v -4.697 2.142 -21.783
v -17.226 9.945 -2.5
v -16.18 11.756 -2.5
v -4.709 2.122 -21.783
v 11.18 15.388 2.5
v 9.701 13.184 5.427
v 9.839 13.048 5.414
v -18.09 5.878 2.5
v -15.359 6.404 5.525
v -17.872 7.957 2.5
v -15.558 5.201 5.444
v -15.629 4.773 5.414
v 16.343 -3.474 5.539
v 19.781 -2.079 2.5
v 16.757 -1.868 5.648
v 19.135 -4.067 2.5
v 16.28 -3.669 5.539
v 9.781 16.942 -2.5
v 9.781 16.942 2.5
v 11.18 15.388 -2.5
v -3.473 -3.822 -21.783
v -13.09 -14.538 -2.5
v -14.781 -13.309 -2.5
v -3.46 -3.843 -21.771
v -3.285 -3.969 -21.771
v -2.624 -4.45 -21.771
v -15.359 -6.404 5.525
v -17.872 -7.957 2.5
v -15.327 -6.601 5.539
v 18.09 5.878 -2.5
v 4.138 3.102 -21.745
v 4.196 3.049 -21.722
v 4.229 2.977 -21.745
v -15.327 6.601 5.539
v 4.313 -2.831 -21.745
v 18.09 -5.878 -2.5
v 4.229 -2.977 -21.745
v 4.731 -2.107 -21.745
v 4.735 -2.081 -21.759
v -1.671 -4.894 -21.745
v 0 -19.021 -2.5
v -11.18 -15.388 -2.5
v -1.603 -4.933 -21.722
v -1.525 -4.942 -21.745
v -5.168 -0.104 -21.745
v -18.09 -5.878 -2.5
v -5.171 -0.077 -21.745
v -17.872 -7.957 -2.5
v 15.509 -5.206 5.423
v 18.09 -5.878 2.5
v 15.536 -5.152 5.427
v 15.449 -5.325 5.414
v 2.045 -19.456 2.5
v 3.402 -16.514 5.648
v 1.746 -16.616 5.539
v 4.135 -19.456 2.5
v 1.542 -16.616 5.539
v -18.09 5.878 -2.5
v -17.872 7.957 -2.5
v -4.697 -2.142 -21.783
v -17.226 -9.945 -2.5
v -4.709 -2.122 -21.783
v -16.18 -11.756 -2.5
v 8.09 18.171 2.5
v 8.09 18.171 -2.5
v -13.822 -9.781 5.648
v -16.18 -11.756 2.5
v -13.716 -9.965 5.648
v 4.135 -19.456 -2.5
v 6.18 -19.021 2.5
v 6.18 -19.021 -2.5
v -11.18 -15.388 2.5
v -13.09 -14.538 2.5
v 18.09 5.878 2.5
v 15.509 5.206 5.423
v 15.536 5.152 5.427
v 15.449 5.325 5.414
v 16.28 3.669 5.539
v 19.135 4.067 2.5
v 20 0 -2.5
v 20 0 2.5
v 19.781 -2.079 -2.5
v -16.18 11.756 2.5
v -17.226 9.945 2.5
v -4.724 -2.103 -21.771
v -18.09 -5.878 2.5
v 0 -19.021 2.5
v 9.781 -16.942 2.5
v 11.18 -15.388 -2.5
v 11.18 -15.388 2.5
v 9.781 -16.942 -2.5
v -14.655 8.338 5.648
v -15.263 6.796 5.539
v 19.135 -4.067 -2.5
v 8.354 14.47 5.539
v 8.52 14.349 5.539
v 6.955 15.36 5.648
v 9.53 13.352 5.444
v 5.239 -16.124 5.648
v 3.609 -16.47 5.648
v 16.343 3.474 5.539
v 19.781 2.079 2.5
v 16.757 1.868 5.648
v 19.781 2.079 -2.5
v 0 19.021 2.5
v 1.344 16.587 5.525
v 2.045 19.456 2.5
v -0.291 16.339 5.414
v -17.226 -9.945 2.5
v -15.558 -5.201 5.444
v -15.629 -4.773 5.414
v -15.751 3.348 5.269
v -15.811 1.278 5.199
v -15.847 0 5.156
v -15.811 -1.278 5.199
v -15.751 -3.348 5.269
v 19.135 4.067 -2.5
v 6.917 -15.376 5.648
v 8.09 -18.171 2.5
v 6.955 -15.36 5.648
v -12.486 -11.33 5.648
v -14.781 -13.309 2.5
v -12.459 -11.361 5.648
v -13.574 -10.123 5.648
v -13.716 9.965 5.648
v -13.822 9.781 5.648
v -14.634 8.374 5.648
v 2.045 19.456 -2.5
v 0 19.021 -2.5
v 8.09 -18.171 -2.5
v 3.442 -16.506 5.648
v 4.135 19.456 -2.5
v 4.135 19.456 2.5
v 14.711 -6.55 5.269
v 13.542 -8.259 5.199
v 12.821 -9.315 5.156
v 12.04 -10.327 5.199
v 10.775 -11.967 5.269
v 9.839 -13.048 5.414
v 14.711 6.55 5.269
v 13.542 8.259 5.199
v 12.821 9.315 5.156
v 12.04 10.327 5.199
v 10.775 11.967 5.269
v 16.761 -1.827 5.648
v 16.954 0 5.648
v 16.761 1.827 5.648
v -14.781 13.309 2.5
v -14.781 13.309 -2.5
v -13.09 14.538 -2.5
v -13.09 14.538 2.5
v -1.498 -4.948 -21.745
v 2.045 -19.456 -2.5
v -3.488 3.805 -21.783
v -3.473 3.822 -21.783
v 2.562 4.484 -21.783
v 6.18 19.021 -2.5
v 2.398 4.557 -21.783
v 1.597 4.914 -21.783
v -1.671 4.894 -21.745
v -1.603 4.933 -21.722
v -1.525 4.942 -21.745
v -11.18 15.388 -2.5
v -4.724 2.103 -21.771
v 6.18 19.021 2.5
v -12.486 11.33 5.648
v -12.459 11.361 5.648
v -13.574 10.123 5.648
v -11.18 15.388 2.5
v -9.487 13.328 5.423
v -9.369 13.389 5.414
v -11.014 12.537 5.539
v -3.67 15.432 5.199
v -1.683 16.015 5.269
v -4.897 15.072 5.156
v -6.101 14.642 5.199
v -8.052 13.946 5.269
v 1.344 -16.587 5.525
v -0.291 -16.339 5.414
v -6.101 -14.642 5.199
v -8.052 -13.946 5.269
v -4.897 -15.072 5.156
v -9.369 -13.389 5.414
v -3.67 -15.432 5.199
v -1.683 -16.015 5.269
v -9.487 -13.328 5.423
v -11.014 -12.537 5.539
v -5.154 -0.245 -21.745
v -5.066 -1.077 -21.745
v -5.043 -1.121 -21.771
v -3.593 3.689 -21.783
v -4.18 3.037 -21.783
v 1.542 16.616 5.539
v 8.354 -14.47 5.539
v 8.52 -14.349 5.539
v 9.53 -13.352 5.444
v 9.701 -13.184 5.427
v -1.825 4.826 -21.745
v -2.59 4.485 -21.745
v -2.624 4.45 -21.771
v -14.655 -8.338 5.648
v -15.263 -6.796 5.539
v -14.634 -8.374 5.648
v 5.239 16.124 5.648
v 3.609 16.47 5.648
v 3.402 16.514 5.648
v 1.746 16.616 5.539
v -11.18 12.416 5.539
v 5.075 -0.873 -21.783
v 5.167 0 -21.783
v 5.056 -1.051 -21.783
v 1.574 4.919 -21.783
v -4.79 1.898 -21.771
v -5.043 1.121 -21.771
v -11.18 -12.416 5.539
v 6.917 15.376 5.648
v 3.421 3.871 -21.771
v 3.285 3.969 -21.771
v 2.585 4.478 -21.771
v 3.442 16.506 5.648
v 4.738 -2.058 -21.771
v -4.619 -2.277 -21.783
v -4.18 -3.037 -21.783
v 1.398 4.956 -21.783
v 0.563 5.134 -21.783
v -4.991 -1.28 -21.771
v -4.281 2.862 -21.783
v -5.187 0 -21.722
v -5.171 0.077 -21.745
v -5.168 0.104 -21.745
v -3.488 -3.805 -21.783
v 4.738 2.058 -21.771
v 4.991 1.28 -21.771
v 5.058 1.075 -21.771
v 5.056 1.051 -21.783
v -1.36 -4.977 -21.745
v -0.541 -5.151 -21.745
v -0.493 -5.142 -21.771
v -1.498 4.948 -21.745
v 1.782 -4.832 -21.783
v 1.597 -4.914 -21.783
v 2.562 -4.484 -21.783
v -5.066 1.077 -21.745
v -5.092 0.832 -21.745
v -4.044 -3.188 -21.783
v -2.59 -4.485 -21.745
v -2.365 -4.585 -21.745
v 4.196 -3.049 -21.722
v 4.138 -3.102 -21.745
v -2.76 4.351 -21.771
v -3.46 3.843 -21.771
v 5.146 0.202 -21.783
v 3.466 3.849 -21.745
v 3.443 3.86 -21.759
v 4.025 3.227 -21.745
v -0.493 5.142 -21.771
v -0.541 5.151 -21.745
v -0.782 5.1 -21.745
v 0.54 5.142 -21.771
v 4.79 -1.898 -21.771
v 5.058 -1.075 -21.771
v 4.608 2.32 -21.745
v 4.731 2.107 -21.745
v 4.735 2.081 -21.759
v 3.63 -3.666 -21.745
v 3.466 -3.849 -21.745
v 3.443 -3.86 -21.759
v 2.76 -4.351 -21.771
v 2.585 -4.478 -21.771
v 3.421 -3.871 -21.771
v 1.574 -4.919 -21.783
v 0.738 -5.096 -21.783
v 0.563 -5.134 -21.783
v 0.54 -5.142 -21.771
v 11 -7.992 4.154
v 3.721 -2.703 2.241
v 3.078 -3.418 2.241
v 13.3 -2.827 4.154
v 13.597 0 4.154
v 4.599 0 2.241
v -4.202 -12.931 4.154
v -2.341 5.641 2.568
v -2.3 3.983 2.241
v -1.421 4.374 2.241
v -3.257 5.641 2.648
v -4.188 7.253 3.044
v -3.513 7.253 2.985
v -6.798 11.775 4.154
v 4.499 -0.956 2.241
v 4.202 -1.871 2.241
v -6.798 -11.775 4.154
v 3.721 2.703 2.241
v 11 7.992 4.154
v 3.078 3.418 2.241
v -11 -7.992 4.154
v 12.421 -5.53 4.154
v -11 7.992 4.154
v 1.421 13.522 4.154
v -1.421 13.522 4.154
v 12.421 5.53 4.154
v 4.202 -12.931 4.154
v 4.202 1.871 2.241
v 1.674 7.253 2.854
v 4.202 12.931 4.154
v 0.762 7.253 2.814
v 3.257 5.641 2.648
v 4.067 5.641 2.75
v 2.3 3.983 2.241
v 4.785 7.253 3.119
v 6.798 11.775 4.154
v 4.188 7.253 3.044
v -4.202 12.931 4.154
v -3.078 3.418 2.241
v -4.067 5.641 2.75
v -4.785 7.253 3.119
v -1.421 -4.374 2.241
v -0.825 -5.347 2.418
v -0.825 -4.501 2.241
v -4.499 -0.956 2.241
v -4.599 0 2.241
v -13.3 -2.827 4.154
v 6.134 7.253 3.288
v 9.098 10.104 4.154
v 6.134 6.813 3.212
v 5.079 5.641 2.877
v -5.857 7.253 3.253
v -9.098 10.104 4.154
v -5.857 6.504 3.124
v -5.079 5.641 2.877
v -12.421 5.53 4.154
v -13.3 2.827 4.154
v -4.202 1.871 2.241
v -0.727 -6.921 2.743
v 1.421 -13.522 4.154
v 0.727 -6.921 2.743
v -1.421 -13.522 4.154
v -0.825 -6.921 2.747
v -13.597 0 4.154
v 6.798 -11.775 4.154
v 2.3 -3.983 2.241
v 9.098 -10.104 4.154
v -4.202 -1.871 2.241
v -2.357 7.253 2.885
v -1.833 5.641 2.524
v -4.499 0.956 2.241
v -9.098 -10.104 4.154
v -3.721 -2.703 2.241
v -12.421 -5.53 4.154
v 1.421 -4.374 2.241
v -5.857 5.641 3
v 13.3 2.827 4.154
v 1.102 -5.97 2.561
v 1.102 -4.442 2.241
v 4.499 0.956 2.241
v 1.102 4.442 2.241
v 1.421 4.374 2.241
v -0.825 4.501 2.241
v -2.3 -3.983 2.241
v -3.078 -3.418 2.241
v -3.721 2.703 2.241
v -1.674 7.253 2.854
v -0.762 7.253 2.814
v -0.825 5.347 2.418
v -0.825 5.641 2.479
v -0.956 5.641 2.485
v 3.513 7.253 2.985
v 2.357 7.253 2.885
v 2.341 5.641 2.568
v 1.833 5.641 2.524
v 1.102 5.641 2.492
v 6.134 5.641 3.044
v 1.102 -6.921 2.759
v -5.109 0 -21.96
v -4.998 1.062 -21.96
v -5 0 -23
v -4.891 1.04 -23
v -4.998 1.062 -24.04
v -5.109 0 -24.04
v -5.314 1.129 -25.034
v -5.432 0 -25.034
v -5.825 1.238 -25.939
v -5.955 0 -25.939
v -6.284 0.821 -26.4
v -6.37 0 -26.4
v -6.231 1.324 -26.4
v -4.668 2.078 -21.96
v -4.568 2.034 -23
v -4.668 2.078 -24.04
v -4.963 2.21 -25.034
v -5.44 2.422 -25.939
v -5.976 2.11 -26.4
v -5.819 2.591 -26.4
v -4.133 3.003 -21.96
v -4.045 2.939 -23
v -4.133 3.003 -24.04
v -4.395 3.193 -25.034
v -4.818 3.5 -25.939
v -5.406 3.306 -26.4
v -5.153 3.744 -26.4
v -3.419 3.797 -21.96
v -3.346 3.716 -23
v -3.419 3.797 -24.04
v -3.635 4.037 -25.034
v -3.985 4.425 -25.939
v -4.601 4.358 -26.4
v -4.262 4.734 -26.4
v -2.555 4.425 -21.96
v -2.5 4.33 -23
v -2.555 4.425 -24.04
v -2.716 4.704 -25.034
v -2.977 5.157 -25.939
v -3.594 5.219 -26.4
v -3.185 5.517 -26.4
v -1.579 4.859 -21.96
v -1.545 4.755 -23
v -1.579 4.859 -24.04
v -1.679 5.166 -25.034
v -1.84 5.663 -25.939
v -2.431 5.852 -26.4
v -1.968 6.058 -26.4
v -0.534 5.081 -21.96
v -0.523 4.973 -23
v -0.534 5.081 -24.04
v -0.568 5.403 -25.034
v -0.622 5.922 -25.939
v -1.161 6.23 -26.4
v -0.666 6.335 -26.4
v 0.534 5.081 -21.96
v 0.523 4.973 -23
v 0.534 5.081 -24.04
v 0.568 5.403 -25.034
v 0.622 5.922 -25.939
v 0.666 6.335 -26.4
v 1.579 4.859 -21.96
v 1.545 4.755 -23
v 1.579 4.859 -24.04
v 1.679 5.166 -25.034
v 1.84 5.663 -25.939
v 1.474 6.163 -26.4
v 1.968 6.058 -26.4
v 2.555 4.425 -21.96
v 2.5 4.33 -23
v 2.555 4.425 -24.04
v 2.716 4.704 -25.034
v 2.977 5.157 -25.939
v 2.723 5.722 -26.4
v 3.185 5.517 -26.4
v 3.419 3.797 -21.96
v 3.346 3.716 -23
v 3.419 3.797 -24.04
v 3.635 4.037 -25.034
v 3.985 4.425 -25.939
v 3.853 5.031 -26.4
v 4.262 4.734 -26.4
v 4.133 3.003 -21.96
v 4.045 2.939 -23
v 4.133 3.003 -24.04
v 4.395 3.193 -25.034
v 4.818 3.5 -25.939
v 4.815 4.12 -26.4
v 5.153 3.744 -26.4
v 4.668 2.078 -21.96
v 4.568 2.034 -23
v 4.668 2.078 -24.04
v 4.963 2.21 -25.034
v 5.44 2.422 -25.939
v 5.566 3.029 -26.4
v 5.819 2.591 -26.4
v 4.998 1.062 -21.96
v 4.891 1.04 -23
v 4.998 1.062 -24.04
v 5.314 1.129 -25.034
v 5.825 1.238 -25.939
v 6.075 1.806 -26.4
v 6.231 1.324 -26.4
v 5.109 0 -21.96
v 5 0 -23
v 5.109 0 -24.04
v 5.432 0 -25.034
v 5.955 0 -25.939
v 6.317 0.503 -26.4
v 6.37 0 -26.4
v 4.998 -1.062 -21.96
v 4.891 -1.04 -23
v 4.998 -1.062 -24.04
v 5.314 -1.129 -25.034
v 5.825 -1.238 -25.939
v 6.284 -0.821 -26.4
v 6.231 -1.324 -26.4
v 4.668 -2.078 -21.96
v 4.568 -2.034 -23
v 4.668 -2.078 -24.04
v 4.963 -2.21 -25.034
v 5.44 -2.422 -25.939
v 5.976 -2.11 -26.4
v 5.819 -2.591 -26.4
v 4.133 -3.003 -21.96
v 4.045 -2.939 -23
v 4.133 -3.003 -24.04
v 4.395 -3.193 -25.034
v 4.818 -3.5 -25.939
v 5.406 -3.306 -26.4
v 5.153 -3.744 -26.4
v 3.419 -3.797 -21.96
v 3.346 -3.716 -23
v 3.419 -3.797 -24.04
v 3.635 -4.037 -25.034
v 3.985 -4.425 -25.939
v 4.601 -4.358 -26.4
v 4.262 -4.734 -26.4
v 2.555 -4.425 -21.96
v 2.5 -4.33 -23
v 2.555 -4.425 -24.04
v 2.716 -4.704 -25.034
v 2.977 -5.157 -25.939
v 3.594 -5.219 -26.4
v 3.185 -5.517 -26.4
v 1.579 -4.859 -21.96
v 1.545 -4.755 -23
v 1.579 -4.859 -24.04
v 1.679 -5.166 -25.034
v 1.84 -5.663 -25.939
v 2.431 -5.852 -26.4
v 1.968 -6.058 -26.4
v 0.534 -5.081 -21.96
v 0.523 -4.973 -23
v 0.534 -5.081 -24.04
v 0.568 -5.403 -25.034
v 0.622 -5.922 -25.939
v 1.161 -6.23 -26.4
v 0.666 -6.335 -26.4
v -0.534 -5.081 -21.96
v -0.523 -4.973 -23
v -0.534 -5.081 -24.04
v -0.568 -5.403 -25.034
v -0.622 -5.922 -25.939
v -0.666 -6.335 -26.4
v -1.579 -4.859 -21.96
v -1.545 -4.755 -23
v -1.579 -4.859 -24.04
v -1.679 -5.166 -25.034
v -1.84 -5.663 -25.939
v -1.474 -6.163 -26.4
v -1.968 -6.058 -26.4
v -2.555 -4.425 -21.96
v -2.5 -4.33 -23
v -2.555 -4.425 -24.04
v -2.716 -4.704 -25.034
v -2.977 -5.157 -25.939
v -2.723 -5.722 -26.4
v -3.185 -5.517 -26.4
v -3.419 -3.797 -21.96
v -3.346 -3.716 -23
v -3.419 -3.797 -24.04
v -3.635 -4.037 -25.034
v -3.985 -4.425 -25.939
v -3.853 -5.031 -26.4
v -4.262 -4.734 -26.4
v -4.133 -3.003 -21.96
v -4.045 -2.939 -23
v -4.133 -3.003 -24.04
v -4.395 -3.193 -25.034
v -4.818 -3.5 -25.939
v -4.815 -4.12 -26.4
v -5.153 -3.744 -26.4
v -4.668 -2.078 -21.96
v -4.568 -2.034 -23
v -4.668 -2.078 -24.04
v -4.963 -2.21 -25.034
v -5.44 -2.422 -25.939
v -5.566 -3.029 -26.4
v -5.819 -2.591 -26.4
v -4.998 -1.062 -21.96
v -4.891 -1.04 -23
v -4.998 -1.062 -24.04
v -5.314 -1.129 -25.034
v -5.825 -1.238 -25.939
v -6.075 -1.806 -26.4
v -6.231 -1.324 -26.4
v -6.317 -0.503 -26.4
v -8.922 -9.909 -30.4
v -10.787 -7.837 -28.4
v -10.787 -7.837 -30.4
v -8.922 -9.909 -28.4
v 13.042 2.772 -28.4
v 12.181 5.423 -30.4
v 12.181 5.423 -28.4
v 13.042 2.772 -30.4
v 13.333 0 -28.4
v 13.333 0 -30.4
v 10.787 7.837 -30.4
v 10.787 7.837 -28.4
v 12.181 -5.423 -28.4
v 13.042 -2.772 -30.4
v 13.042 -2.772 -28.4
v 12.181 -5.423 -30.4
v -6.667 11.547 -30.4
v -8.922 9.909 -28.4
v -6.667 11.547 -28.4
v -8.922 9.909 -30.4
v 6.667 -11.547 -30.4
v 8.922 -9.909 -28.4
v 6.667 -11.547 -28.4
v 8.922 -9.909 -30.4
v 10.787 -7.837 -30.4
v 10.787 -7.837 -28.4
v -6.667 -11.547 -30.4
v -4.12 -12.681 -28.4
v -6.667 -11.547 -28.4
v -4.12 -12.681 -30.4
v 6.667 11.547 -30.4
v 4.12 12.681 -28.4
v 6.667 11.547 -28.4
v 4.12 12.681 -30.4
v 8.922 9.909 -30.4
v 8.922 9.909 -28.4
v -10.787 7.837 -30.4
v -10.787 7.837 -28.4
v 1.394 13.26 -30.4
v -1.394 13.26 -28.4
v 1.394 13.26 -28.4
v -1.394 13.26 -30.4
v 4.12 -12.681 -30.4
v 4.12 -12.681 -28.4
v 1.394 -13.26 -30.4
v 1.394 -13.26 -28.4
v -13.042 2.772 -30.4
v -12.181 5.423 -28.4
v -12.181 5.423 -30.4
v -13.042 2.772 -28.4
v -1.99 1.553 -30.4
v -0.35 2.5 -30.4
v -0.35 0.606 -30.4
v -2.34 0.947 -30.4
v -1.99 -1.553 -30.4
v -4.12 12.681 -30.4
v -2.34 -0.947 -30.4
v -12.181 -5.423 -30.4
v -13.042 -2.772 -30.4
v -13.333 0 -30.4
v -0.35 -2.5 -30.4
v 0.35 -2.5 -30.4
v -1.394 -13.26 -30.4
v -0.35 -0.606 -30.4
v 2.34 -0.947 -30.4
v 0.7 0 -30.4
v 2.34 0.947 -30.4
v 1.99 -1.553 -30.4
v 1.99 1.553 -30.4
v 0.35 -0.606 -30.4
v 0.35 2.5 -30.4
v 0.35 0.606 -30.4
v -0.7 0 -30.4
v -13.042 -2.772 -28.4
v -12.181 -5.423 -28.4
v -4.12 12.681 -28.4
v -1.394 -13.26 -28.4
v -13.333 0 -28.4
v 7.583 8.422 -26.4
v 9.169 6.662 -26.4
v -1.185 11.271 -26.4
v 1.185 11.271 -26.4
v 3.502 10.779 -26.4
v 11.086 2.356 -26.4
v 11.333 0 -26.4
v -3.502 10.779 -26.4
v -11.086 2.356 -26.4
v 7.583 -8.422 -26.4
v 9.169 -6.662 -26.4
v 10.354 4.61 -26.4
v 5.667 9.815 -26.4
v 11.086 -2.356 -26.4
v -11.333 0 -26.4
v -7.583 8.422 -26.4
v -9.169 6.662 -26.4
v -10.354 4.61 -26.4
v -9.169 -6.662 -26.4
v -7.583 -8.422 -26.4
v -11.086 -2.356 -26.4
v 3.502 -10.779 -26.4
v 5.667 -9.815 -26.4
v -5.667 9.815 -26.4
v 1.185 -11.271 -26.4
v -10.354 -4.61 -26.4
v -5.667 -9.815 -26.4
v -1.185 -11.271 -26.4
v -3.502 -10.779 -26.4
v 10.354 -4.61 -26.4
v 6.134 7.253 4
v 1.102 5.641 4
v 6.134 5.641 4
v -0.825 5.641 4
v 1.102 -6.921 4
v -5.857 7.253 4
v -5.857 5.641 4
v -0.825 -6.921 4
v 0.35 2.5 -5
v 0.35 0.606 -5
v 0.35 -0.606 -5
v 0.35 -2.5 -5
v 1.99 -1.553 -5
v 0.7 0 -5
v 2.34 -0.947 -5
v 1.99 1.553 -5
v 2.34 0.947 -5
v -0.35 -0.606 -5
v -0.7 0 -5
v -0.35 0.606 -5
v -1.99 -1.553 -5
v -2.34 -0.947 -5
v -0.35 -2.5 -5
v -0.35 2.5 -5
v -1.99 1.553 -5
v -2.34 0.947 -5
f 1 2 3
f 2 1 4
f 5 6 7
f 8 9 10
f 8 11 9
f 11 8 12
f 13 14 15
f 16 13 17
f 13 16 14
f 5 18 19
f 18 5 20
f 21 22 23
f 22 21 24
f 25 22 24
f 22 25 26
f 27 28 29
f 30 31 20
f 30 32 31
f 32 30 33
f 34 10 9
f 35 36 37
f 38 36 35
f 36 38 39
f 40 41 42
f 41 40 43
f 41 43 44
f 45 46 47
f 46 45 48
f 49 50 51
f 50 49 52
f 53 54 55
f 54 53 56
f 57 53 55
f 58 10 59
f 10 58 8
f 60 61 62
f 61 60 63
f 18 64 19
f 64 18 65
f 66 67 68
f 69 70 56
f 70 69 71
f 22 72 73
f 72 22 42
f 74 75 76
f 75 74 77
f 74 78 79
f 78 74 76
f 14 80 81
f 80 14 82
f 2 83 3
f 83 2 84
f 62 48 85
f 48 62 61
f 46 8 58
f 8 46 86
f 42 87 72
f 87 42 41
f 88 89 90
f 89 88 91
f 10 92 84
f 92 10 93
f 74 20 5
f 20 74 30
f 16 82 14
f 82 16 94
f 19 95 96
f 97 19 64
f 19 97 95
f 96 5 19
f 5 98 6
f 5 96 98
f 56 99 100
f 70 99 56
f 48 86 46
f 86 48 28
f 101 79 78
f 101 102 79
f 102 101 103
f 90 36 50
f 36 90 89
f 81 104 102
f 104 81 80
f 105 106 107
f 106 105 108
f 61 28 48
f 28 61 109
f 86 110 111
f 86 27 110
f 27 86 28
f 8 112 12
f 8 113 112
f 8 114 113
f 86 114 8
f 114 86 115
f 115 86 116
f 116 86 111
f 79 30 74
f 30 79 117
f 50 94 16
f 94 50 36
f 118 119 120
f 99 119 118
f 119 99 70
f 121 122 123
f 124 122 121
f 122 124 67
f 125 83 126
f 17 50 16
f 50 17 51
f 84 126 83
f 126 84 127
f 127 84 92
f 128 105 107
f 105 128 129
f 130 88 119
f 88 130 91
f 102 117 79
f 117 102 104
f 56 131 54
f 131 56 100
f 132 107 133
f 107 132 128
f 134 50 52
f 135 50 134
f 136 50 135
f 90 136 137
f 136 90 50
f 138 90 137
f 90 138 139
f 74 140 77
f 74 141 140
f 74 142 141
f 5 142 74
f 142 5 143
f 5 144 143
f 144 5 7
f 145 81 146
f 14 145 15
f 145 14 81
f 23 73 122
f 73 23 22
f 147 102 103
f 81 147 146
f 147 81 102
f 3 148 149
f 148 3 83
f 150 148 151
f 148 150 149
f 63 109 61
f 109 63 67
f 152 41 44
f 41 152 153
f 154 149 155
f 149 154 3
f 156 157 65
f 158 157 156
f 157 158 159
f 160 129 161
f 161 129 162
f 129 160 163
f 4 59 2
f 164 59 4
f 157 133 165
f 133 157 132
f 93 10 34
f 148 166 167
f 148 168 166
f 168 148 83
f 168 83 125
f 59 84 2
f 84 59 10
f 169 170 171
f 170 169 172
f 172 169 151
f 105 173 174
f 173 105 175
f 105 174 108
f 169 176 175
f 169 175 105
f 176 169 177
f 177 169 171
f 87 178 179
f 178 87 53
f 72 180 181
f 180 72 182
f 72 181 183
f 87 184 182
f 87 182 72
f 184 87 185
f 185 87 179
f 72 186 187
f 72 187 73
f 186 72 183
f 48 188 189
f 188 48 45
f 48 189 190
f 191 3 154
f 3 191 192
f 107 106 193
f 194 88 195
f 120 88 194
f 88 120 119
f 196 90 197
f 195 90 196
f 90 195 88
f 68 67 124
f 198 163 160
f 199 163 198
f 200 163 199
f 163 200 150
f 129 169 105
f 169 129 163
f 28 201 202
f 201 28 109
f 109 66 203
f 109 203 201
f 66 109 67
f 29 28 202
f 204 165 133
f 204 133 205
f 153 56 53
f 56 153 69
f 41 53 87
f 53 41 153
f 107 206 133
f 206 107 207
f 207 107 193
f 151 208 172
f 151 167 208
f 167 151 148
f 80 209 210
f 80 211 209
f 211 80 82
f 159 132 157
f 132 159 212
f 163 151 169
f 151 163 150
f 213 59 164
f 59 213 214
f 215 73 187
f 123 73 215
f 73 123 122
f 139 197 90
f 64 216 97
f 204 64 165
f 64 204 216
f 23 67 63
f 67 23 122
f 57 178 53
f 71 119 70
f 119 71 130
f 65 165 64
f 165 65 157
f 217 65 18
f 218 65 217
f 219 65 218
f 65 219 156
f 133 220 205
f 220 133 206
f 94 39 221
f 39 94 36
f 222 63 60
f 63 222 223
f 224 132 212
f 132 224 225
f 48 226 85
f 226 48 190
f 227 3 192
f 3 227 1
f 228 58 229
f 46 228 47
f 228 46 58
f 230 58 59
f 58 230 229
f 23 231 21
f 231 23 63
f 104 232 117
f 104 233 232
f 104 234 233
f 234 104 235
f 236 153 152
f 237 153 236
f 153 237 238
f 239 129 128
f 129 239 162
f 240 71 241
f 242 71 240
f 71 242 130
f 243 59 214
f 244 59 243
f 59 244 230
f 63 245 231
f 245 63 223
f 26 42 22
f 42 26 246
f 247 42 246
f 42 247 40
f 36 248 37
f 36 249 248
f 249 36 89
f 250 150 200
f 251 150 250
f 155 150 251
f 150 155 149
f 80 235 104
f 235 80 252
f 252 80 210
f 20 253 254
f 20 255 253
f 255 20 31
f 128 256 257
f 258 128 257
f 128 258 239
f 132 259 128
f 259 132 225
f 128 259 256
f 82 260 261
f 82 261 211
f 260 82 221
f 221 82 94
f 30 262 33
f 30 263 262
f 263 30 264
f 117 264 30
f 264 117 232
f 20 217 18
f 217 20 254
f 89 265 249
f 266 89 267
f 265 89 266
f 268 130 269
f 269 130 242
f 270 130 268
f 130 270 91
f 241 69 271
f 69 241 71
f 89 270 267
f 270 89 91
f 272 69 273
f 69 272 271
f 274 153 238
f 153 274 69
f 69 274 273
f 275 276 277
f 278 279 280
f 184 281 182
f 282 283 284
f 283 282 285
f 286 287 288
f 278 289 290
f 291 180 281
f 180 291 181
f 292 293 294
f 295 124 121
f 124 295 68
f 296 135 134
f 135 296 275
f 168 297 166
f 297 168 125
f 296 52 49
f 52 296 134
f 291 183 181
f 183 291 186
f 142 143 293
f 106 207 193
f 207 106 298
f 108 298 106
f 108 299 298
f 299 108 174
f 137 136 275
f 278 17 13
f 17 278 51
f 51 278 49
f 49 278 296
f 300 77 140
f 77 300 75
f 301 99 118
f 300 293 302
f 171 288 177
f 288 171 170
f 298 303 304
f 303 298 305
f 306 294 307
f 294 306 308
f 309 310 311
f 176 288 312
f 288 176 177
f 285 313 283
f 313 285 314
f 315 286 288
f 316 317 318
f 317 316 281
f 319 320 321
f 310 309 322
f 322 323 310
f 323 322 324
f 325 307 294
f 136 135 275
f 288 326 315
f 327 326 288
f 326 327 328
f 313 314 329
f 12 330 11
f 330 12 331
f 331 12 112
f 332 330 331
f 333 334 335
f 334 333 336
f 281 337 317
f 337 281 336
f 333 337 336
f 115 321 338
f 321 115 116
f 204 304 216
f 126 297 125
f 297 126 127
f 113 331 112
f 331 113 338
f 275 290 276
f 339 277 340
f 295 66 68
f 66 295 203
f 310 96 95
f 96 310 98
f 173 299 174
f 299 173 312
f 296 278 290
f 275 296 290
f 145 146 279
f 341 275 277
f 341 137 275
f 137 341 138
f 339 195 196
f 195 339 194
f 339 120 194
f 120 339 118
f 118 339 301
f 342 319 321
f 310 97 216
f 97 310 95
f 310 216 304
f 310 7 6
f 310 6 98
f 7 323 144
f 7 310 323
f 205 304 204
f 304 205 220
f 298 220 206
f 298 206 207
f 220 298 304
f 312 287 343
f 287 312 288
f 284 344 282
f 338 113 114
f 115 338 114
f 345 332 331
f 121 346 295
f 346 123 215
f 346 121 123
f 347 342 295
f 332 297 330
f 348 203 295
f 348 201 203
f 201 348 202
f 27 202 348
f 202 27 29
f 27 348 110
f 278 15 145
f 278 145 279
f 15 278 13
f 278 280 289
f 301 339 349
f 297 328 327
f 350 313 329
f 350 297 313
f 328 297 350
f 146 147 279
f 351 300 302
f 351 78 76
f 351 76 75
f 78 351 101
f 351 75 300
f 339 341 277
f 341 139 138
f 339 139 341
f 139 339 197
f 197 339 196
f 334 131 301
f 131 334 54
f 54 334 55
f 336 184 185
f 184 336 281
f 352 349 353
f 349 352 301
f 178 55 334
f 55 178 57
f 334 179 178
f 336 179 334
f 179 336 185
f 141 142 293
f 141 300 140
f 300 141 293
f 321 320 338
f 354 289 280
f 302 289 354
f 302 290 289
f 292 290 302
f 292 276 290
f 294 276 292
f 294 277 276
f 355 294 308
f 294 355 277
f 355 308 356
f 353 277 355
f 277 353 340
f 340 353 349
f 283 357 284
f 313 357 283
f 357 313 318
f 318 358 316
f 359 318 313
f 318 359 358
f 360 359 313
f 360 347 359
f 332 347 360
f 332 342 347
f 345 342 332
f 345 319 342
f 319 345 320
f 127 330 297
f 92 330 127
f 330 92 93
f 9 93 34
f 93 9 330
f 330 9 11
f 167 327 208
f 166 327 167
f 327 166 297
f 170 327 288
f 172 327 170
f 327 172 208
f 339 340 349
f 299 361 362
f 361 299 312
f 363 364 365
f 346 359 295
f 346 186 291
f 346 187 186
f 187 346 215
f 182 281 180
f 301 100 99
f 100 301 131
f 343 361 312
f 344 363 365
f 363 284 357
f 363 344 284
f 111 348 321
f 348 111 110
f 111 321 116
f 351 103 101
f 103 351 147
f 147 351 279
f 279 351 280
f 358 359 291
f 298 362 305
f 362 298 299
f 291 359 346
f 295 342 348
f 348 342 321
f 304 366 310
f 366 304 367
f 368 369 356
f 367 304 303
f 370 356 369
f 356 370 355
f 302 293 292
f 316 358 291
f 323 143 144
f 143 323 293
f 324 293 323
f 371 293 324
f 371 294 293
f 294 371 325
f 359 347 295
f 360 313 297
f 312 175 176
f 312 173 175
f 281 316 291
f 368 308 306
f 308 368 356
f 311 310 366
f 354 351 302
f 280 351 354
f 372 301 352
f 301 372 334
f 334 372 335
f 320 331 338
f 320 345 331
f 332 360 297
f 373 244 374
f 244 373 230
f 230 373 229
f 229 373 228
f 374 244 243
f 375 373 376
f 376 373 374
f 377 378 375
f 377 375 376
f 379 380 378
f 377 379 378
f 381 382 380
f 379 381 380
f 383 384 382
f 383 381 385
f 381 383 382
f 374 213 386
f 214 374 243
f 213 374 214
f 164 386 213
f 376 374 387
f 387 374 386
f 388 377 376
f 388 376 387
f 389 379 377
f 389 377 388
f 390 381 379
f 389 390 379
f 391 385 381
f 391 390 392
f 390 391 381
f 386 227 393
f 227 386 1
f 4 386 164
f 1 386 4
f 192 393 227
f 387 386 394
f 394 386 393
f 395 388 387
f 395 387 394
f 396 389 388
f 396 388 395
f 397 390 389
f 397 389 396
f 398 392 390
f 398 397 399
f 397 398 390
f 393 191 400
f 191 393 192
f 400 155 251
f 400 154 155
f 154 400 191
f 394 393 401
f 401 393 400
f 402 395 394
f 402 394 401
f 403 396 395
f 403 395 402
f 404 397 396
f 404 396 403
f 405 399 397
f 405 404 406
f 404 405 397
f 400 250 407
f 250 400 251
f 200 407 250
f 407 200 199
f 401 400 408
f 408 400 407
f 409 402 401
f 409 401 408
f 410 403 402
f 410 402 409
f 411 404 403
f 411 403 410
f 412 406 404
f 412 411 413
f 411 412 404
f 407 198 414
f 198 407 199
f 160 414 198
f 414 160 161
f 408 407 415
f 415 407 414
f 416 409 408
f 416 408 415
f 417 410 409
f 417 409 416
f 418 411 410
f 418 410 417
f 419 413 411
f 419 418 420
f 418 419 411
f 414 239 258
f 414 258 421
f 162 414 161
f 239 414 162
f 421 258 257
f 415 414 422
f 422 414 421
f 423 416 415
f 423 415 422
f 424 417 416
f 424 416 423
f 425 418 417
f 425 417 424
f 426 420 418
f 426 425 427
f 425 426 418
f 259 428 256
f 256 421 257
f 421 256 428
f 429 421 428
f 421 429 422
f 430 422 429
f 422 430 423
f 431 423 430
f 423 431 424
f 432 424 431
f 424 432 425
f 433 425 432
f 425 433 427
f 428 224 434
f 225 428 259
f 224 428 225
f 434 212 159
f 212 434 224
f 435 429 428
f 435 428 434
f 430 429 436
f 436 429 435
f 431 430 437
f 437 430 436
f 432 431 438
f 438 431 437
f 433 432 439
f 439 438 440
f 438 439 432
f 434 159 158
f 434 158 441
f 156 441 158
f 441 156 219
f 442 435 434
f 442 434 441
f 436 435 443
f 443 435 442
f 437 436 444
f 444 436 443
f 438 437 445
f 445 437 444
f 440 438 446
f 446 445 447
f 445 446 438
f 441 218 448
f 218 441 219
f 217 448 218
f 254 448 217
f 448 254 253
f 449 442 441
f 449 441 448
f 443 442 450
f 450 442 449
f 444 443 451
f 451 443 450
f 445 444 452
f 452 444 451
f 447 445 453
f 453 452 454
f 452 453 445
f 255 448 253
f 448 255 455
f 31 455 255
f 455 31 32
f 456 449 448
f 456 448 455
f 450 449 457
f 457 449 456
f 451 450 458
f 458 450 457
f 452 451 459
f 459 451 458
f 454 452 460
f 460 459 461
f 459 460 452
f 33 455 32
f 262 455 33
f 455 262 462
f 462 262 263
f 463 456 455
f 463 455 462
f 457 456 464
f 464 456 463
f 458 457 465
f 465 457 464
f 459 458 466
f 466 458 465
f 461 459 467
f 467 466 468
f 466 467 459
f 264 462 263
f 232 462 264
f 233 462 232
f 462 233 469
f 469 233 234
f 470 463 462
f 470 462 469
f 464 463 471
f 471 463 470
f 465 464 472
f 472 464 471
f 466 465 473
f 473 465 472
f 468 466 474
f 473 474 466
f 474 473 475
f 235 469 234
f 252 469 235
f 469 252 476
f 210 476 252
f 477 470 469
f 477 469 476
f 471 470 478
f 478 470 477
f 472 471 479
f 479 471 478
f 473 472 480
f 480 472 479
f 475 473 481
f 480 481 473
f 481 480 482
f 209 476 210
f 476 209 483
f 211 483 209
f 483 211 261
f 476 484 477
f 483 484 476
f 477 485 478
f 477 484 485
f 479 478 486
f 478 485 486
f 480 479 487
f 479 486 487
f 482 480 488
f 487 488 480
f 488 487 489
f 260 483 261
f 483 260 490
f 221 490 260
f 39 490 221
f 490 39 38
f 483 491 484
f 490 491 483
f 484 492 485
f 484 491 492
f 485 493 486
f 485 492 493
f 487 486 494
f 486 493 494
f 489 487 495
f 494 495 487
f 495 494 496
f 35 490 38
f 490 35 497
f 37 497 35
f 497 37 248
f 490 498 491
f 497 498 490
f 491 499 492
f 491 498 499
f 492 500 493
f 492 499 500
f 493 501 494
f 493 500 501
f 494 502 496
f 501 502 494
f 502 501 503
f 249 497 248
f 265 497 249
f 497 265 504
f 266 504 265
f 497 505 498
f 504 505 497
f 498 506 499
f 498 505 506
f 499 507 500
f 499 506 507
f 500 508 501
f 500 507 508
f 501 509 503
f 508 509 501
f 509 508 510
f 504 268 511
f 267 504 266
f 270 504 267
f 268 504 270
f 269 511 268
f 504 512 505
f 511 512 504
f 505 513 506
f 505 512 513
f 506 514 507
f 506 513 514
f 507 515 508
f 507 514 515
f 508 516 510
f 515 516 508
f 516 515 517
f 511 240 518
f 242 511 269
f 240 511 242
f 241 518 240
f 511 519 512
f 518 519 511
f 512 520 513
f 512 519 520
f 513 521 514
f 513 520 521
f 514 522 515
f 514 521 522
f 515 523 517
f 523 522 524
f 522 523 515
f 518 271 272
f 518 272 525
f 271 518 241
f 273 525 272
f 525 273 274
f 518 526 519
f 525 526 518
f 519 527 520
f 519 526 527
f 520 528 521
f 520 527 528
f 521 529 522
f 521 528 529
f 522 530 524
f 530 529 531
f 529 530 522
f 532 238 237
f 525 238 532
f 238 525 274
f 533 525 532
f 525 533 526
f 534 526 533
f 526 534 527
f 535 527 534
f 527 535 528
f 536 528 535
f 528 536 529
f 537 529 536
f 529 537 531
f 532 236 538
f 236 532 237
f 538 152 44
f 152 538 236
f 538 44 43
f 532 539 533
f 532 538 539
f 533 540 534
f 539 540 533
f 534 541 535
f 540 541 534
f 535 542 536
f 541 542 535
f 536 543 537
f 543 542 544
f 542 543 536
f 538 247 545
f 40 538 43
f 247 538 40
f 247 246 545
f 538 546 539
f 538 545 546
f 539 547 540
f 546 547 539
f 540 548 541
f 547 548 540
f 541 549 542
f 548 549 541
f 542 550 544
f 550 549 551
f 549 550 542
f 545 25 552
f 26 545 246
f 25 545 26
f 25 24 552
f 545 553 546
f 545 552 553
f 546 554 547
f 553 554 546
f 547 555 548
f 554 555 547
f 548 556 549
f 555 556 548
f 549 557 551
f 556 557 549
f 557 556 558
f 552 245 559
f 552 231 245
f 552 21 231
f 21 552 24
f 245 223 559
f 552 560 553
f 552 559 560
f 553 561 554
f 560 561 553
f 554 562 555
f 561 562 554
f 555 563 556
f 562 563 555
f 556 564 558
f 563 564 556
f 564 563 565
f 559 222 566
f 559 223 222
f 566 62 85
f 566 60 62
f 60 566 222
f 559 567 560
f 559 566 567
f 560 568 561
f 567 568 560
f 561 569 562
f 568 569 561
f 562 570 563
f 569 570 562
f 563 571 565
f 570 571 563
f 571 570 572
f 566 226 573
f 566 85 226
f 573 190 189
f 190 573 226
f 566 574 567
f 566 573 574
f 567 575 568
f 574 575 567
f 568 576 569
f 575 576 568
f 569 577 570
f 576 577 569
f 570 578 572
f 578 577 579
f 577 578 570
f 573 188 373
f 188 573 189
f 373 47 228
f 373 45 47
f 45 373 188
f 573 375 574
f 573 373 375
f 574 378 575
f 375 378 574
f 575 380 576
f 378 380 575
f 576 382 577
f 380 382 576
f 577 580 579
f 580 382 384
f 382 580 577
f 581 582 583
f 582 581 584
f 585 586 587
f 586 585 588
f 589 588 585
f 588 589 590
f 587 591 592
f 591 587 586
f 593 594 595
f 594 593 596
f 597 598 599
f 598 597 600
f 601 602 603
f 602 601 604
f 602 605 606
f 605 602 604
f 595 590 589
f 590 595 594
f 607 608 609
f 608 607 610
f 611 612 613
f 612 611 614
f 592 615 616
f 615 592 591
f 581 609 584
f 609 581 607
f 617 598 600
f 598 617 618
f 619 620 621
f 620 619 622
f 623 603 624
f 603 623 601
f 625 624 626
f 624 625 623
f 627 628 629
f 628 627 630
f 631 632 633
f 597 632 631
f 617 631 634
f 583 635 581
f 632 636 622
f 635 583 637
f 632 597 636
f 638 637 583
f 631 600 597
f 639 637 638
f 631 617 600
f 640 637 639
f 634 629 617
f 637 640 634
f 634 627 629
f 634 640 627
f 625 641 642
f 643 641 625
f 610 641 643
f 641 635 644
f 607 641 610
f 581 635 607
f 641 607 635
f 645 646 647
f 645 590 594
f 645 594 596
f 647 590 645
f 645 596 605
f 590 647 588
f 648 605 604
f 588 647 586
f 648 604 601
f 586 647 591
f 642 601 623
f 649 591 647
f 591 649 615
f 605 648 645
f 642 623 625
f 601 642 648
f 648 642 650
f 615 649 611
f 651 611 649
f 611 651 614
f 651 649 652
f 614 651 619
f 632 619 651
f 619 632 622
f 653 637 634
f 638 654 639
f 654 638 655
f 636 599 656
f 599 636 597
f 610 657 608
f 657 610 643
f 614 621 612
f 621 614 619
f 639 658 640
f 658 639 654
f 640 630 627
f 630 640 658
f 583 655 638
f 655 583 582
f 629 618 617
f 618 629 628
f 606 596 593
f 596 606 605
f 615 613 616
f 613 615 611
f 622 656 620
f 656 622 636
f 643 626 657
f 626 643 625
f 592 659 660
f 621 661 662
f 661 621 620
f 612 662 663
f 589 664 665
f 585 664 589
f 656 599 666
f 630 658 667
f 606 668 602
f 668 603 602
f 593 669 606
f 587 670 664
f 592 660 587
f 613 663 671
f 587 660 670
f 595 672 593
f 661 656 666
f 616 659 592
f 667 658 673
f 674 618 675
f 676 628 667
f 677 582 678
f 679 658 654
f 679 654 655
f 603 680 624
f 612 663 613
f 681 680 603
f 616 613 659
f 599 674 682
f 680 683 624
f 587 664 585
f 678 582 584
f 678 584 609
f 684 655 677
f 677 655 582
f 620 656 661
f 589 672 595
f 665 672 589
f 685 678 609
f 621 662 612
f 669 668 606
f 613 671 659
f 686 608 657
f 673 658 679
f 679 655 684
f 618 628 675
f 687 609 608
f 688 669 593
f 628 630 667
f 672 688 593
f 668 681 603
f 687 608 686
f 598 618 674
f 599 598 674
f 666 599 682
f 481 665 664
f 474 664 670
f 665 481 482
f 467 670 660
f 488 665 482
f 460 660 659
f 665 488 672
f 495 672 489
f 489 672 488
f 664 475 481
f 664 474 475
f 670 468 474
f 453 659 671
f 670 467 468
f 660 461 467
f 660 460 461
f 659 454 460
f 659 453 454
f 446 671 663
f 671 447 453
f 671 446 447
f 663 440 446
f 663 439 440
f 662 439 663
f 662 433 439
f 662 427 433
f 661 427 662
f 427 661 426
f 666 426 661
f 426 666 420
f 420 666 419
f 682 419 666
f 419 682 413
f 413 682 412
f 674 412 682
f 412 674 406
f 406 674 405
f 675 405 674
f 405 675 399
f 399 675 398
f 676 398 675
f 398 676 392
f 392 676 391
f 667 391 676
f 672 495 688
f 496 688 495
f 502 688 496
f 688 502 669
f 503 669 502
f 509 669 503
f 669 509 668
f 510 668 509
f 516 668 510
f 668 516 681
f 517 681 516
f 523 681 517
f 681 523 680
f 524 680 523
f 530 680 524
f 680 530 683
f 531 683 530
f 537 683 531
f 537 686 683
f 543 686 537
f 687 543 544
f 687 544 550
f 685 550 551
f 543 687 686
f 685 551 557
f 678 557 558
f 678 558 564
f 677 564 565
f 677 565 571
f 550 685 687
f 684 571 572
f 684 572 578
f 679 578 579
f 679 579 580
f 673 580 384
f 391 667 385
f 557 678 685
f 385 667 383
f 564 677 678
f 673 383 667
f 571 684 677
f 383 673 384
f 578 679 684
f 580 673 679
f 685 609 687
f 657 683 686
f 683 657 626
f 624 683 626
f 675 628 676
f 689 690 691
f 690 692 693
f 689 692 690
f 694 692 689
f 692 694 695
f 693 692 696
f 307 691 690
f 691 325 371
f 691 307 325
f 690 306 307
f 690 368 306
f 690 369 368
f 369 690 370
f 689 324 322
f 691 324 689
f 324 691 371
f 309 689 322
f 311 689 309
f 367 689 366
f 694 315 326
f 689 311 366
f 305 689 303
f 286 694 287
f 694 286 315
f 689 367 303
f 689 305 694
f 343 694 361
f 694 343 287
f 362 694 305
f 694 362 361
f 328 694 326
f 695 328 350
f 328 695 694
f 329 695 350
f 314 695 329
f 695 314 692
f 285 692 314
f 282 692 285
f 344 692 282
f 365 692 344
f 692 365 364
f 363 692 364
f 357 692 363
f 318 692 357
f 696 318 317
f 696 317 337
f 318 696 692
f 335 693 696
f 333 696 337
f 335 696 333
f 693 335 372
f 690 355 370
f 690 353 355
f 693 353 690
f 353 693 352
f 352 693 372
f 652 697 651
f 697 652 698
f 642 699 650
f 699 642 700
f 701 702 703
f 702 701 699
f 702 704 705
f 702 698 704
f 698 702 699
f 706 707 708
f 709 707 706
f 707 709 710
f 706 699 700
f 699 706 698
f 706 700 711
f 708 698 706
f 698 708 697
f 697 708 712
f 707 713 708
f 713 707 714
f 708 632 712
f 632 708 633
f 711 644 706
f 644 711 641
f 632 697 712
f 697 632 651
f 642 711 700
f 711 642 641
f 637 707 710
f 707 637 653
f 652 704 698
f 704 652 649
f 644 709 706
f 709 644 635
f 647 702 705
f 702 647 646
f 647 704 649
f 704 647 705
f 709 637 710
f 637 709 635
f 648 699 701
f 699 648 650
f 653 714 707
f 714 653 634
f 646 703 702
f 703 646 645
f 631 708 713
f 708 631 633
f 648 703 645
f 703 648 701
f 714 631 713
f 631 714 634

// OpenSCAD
// door_knob_a.scad
// library for parametric door pull, knob, handle - Style A
// Author: Tony Z. Tonchev, Michigan (USA) 
// last update: November 2018


// (in mm)
Knob_Diameter = 40; //[25:80]

//
Knob_Corners = 5; //[3,4,5,6,7,8]

//
Knob_Roundness = 8; //[1:9]

/* [Monogram Details] */

//
Monogram = "T";

// Platform specific font name (In Customizer: http://www.google.com/fonts)
Font_Name="Marck Script"; //[ABeeZee,Abel,Abril Fatface,Aclonica,Acme,Actor,Adamina,Advent Pro,Aguafina Script,Akronim,Aladin,Aldrich,Alef,Alegreya,Alegreya Sans,Alegreya Sans SC,Alegreya SC,Alex Brush,Alfa Slab One,Alice,Alike,Alike Angular,Allan,Allerta,Allerta Stencil,Allura,Almendra,Almendra Display,Almendra SC,Amarante,Amaranth,Amatic SC,Amethysta,Amiri,Anaheim,Andada,Andika,Angkor,Annie Use Your Telescope,Anonymous Pro,Antic,Antic Didone,Antic Slab,Anton,Arapey,Arbutus,Arbutus Slab,Architects Daughter,Archivo Black,Archivo Narrow,Arimo,Arizonia,Armata,Artifika,Arvo,Asap,Asset,Astloch,Asul,Atomic Age,Aubrey,Audiowide,Autour One,Average,Average Sans,Averia Gruesa Libre,Averia Libre,Averia Sans Libre,Averia Serif Libre,Bad Script,Balthazar,Bangers,Basic,Battambang,Baumans,Bayon,Belgrano,Belleza,BenchNine,Bentham,Berkshire Swash,Bevan,Bigelow Rules,Bigshot One,Bilbo,Bilbo Swash Caps,Bitter,Black Ops One,Bokor,Bonbon,Boogaloo,Bowlby One,Bowlby One SC,Brawler,Bree Serif,Bubblegum Sans,Bubbler One,Buda,Buenard,Butcherman,Butterfly Kids,Cabin,Cabin Condensed,Cabin Sketch,Caesar Dressing,Cagliostro,Calligraffitti,Cambay,Cambo,Candal,Cantarell,Cantata One,Cantora One,Capriola,Cardo,Carme,Carrois Gothic,Carrois Gothic SC,Carter One,Caudex,Cedarville Cursive,Ceviche One,Changa One,Chango,Chau Philomene One,Chela One,Chelsea Market,Chenla,Cherry Cream Soda,Cherry Swash,Chewy,Chicle,Chivo,Cinzel,Cinzel Decorative,Clicker Script,Coda,Coda Caption,Codystar,Combo,Comfortaa,Coming Soon,Concert One,Condiment,Content,Contrail One,Convergence,Cookie,Copse,Corben,Courgette,Cousine,Coustard,Covered By Your Grace,Crafty Girls,Creepster,Crete Round,Crimson Text,Croissant One,Crushed,Cuprum,Cutive,Cutive Mono,Damion,Dancing Script,Dangrek,Dawning of a New Day,Days One,Dekko,Delius,Delius Swash Caps,Delius Unicase,Della Respira,Denk One,Devonshire,Dhurjati,Didact Gothic,Diplomata,Diplomata SC,Domine,Donegal One,Doppio One,Dorsa,Dosis,Dr Sugiyama,Droid Sans,Droid Sans Mono,Droid Serif,Duru Sans,Dynalight,Eagle Lake,Eater,EB Garamond,Economica,Ek Mukta,Electrolize,Elsie,Elsie Swash Caps,Emblema One,Emilys Candy,Engagement,Englebert,Enriqueta,Erica One,Esteban,Euphoria Script,Ewert,Exo,Exo 2,Expletus Sans,Fanwood Text,Fascinate,Fascinate Inline,Faster One,Fasthand,Fauna One,Federant,Federo,Felipa,Fenix,Finger Paint,Fira Mono,Fira Sans,Fjalla One,Fjord One,Flamenco,Flavors,Fondamento,Fontdiner Swanky,Forum,Francois One,Freckle Face,Fredericka the Great,Fredoka One,Freehand,Fresca,Frijole,Fruktur,Fugaz One,Gabriela,Gafata,Galdeano,Galindo,Gentium Basic,Gentium Book Basic,Geo,Geostar,Geostar Fill,Germania One,GFS Didot,GFS Neohellenic,Gidugu,Gilda Display,Give You Glory,Glass Antiqua,Glegoo,Gloria Hallelujah,Goblin One,Gochi Hand,Gorditas,Goudy Bookletter 1911,Graduate,Grand Hotel,Gravitas One,Great Vibes,Griffy,Gruppo,Gudea,Gurajada,Habibi,Halant,Hammersmith One,Hanalei,Hanalei Fill,Handlee,Hanuman,Happy Monkey,Headland One,Henny Penny,Herr Von Muellerhoff,Hind,Holtwood One SC,Homemade Apple,Homenaje,Iceberg,Iceland,IM Fell Double Pica,IM Fell Double Pica SC,IM Fell DW Pica,IM Fell DW Pica SC,IM Fell English,IM Fell English SC,IM Fell French Canon,IM Fell French Canon SC,IM Fell Great Primer,IM Fell Great Primer SC,Imprima,Inconsolata,Inder,Indie Flower,Inika,Irish Grover,Istok Web,Italiana,Italianno,Jacques Francois,Jacques Francois Shadow,Jim Nightshade,Jockey One,Jolly Lodger,Josefin Sans,Josefin Slab,Joti One,Judson,Julee,Julius Sans One,Junge,Jura,Just Another Hand,Just Me Again Down Here,Kalam,Kameron,Kantumruy,Karla,Karma,Kaushan Script,Kavoon,Kdam Thmor,Keania One,Kelly Slab,Kenia,Khand,Khmer,Khula,Kite One,Knewave,Kotta One,Koulen,Kranky,Kreon,Kristi,Krona One,La Belle Aurore,Laila,Lakki Reddy,Lancelot,Lateef,Lato,League Script,Leckerli One,Ledger,Lekton,Lemon,Liberation Sans,Libre Baskerville,Life Savers,Lilita One,Lily Script One,Limelight,Linden Hill,Lobster,Lobster Two,Londrina Outline,Londrina Shadow,Londrina Sketch,Londrina Solid,Lora,Love Ya Like A Sister,Loved by the King,Lovers Quarrel,Luckiest Guy,Lusitana,Lustria,Macondo,Macondo Swash Caps,Magra,Maiden Orange,Mako,Mallanna,Mandali,Marcellus,Marcellus SC,Marck Script,Margarine,Marko One,Marmelad,Martel Sans,Marvel,Mate,Mate SC,Maven Pro,McLaren,Meddon,MedievalSharp,Medula One,Megrim,Meie Script,Merienda,Merienda One,Merriweather,Merriweather Sans,Metal,Metal Mania,Metamorphous,Metrophobic,Michroma,Milonga,Miltonian,Miltonian Tattoo,Miniver,Miss Fajardose,Modak,Modern Antiqua,Molengo,Molle,Monda,Monofett,Monoton,Monsieur La Doulaise,Montaga,Montez,Montserrat,Montserrat Alternates,Montserrat Subrayada,Moul,Moulpali,Mountains of Christmas,Mouse Memoirs,Mr Bedfort,Mr Dafoe,Mr De Haviland,Mrs Saint Delafield,Mrs Sheppards,Muli,Mystery Quest,Neucha,Neuton,New Rocker,News Cycle,Niconne,Nixie One,Nobile,Nokora,Norican,Nosifer,Nothing You Could Do,Noticia Text,Noto Sans,Noto Serif,Nova Cut,Nova Flat,Nova Mono,Nova Oval,Nova Round,Nova Script,Nova Slim,Nova Square,NTR,Numans,Nunito,Odor Mean Chey,Offside,Old Standard TT,Oldenburg,Oleo Script,Oleo Script Swash Caps,Open Sans,Open Sans Condensed,Oranienbaum,Orbitron,Oregano,Orienta,Original Surfer,Oswald,Over the Rainbow,Overlock,Overlock SC,Ovo,Oxygen,Oxygen Mono,Pacifico,Paprika,Parisienne,Passero One,Passion One,Pathway Gothic One,Patrick Hand,Patrick Hand SC,Patua One,Paytone One,Peddana,Peralta,Permanent Marker,Petit Formal Script,Petrona,Philosopher,Piedra,Pinyon Script,Pirata One,Plaster,Play,Playball,Playfair Display,Playfair Display SC,Podkova,Poiret One,Poller One,Poly,Pompiere,Pontano Sans,Port Lligat Sans,Port Lligat Slab,Prata,Preahvihear,Press Start 2P,Princess Sofia,Prociono,Prosto One,PT Mono,PT Sans,PT Sans Caption,PT Sans Narrow,PT Serif,PT Serif Caption,Puritan,Purple Purse,Quando,Quantico,Quattrocento,Quattrocento Sans,Questrial,Quicksand,Quintessential,Qwigley,Racing Sans One,Radley,Rajdhani,Raleway,Raleway Dots,Ramabhadra,Ramaraja,Rambla,Rammetto One,Ranchers,Rancho,Ranga,Rationale,Ravi Prakash,Redressed,Reenie Beanie,Revalia,Ribeye,Ribeye Marrow,Righteous,Risque,Roboto,Roboto Condensed,Roboto Slab,Rochester,Rock Salt,Rokkitt,Romanesco,Ropa Sans,Rosario,Rosarivo,Rouge Script,Rozha One,Rubik Mono One,Rubik One,Ruda,Rufina,Ruge Boogie,Ruluko,Rum Raisin,Ruslan Display,Russo One,Ruthie,Rye,Sacramento,Sail,Salsa,Sanchez,Sancreek,Sansita One,Sarina,Sarpanch,Satisfy,Scada,Scheherazade,Schoolbell,Seaweed Script,Sevillana,Seymour One,Shadows Into Light,Shadows Into Light Two,Shanti,Share,Share Tech,Share Tech Mono,Shojumaru,Short Stack,Siemreap,Sigmar One,Signika,Signika Negative,Simonetta,Sintony,Sirin Stencil,Six Caps,Skranji,Slabo 13px,Slabo 27px,Slackey,Smokum,Smythe,Sniglet,Snippet,Snowburst One,Sofadi One,Sofia,Sonsie One,Sorts Mill Goudy,Source Code Pro,Source Sans Pro,Source Serif Pro,Special Elite,Spicy Rice,Spinnaker,Spirax,Squada One,Sree Krushnadevaraya,Stalemate,Stalinist One,Stardos Stencil,Stint Ultra Condensed,Stint Ultra Expanded,Stoke,Strait,Sue Ellen Francisco,Sunshiney,Supermercado One,Suranna,Suravaram,Suwannaphum,Swanky and Moo Moo,Syncopate,Tangerine,Taprom,Tauri,Teko,Telex,Tenali Ramakrishna,Tenor Sans,Text Me One,The Girl Next Door,Tienne,Timmana,Tinos,Titan One,Titillium Web,Trade Winds,Trocchi,Trochut,Trykker,Tulpen One,Ubuntu,Ubuntu Condensed,Ubuntu Mono,Ultra,Uncial Antiqua,Underdog,Unica One,UnifrakturCook,UnifrakturMaguntia,Unkempt,Unlock,Unna,Vampiro One,Varela,Varela Round,Vast Shadow,Vesper Libre,Vibur,Vidaloka,Viga,Voces,Volkhov,Vollkorn,Voltaire,VT323,Waiting for the Sunrise,Wallpoet,Walter Turncoat,Warnes,Wellfleet,Wendy One,Wire One,Yanone Kaffeesatz,Yellowtail,Yeseva One,Yesteryear,Zeyada]

// (in degrees)
Character_Rotation = 0; //[0:90]


/* [Hidden] */

$fn=30;
$TZT_Cct=Knob_Corners;
$TZT_Bnt=10-Knob_Roundness;
$TZT_Rad=Knob_Diameter/2;

TZT_Msg=Monogram;
TZT_Fnt=Font_Name;
TZT_Frt=Character_Rotation;

difference () {
    union () {
        TZT_Knob ();
        rotate ([0,0,TZT_Frt]) {
            linear_extrude($TZT_Rad*.2) {
                text(TZT_Msg,size=$TZT_Rad*.7,font=TZT_Fnt,halign="center",valign="center");
            }
        }
    }
    for (TZT_i=[0:120:360]) {
        rotate ([0,0,TZT_i]) {
            translate ([0,0,-$TZT_Rad]) {
                cube ([.7,5,$TZT_Rad*1.5],true);
            }
        }
    }
}

module TZT_Knob () {
    union () {
        difference () {
            hull () {
                translate ([0,0,-$TZT_Rad/10]) {
                    cylinder ($TZT_Rad*2,$TZT_Rad/4,$TZT_Rad/4,true);
                }
                for (TZT_i=[0:(360/$TZT_Cct):360]) {
                    rotate ([0,0,TZT_i]) {
                        translate ([$TZT_Rad-$TZT_Rad/$TZT_Bnt,0,0]) {
                            cylinder ($TZT_Rad/4,$TZT_Rad/$TZT_Bnt,$TZT_Rad/$TZT_Bnt,true);
                        }
                    }
                }
            }
            translate ([0,0,$TZT_Rad*2.3]) {
                sphere ($TZT_Rad*2.2);
            }
        } 
        difference(){
            translate ([0,0,-$TZT_Rad*1.2]) {
                TZT_Donut($TZT_Rad/3,$TZT_Rad/4);
            } 
            translate([0,0,-$TZT_Rad*1.15]) {
                TZT_Donut($TZT_Rad/2,$TZT_Rad/4);
            }
            translate([0,0,-$TZT_Rad/1.75]) {
                cylinder ($TZT_Rad,$TZT_Rad,$TZT_Rad,true);
            }
        }    
        translate ([0,0,-$TZT_Rad*1.47]) {
            difference () {
                union () {
                    translate ([0,0,$TZT_Rad/2.1]) {
                        cylinder ($TZT_Rad,$TZT_Rad/4,$TZT_Rad/4,true);
                    }
                    cylinder ($TZT_Rad/10,$TZT_Rad/1.5,$TZT_Rad/1.5,true);
                    translate ([0,0,$TZT_Rad/10]) {
                        cylinder ($TZT_Rad/10,$TZT_Rad/1.5,$TZT_Rad/1.5-$TZT_Rad/10,true);
                    }
                }
            }
        }
    }
}

module TZT_Donut (TZT_Ra,TZT_Rb) {
    rotate_extrude() {
        translate([TZT_Ra, 0, 0])
        circle(TZT_Rb);
    }
}
